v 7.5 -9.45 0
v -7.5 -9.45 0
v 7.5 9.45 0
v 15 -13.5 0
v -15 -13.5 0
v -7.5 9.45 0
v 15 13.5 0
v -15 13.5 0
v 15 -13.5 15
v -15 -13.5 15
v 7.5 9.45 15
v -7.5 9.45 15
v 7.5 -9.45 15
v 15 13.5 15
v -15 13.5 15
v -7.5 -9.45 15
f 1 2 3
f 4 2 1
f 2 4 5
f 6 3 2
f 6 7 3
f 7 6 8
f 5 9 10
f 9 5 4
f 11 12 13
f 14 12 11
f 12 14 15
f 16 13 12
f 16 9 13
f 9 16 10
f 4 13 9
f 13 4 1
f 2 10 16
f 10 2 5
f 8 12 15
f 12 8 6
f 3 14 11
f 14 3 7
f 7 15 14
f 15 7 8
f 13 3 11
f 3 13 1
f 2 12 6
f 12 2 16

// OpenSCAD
width=27;
height=15;
depth=30;



a=[[0,width*0.3],[depth/2,0],[-depth/2,0]];

translate([0,-width/2,0])
linear_extrude(height = height)
polygon(a);

translate([0,width/2,0])
linear_extrude(height = height)
polygon(-a);

translate([-depth/4,-width/2,0])
cube([depth/2,width,height]);
